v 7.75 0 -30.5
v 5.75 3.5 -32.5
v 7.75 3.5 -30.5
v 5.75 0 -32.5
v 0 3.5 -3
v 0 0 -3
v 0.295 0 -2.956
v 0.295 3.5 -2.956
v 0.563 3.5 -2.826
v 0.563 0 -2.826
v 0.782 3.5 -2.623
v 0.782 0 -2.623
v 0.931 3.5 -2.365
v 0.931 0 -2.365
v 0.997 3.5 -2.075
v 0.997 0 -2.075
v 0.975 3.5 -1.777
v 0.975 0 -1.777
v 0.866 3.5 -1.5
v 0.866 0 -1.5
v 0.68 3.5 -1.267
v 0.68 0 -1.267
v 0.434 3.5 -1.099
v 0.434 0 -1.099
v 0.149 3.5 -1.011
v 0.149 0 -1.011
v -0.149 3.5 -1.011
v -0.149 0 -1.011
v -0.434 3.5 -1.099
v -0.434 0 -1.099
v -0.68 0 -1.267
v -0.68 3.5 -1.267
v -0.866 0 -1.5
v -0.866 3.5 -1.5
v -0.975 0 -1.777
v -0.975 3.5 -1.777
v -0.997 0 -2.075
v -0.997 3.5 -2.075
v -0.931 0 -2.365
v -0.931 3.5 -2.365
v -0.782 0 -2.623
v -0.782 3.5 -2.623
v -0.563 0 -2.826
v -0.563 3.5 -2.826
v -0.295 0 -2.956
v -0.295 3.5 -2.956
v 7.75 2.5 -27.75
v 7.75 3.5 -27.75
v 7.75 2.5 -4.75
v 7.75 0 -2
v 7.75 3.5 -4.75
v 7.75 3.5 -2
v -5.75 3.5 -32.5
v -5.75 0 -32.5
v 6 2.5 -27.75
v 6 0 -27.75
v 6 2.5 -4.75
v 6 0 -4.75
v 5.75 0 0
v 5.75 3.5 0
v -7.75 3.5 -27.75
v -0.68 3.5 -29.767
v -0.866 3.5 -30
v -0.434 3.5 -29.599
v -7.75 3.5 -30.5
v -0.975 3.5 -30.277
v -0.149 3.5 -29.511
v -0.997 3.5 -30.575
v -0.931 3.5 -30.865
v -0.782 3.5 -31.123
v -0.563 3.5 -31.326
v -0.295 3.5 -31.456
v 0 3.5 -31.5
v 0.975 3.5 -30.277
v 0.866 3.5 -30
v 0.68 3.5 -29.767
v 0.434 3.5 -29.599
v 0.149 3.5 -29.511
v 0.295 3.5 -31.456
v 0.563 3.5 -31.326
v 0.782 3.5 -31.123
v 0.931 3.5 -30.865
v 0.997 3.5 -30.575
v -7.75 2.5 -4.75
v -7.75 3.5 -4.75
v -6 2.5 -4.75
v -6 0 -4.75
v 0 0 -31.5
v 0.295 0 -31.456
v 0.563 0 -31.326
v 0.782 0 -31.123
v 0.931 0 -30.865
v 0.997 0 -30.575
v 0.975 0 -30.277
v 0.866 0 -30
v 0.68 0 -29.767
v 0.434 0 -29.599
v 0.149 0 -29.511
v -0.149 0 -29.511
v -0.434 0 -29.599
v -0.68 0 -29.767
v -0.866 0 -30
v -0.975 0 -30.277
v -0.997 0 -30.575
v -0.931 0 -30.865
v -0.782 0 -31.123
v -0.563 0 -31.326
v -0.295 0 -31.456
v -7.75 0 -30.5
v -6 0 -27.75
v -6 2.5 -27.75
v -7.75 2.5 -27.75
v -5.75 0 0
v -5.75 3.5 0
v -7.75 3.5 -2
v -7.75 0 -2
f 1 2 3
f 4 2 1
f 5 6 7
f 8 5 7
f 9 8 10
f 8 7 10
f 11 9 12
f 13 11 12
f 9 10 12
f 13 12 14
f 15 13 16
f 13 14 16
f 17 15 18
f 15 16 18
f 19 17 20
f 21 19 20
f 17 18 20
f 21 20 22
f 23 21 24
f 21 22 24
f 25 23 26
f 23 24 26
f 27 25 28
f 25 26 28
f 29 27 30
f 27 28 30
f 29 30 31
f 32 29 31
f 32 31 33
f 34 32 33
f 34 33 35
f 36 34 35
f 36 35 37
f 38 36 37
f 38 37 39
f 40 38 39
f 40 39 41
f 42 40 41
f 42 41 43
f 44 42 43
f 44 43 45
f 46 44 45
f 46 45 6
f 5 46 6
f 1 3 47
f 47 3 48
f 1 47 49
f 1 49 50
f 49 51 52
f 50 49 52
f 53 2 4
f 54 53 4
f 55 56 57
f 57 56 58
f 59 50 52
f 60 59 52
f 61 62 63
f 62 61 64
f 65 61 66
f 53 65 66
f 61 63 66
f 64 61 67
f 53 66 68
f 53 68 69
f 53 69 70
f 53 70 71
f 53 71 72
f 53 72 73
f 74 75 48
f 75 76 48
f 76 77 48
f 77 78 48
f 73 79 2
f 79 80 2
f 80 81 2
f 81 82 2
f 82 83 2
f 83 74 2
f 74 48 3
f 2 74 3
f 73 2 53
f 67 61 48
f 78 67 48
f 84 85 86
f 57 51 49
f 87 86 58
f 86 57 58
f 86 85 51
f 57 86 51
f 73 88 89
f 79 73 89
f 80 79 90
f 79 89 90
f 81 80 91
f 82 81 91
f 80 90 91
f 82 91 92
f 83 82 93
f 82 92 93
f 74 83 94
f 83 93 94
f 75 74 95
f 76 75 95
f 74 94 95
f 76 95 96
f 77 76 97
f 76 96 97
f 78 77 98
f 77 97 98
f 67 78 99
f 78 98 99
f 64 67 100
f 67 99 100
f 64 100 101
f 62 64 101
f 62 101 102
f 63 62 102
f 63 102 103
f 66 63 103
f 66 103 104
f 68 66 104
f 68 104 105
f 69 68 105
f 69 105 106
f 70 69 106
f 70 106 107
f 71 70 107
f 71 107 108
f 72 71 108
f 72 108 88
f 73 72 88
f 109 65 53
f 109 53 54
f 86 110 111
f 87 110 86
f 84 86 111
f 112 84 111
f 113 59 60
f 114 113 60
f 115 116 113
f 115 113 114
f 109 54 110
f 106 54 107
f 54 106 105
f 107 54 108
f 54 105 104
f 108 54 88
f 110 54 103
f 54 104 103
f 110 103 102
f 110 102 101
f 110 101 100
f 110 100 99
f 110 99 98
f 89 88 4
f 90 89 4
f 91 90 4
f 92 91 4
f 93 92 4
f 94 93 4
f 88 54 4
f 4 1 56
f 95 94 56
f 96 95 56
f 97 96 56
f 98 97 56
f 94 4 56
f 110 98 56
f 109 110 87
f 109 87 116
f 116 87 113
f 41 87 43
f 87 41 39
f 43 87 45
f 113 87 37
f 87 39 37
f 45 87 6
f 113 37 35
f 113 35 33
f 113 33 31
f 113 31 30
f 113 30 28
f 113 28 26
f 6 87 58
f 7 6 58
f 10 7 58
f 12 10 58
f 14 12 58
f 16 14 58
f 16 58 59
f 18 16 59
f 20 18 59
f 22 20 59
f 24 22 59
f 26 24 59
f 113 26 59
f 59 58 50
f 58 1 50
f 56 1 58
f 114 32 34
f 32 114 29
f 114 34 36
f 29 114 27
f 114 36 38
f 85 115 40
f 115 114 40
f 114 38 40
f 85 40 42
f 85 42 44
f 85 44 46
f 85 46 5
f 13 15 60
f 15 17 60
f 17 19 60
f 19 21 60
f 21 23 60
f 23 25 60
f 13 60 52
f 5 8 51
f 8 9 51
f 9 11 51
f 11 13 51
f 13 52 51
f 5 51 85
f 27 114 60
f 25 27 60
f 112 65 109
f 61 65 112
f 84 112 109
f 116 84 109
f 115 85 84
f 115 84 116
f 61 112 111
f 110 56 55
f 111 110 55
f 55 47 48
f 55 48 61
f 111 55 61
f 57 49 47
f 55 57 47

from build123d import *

# Parameters (mm, degrees)
EXTRUDE_1_DEPTH     = 7.75
SKETCH_3_R          = 1
SKETCH_3_W          = 12
SKETCH_3_H          = 23
CUT_EXTRUDE_1_DEPTH = 34.594084301
CHAMFER_1_SIZE      = 2


with BuildPart() as part:
    # 草圖2 → 填料-伸長1 (new, symmetric)
    with BuildSketch(Plane(origin=(0, 0, 0), x_dir=(0, 0, -1), z_dir=(1, 0, 0))):
        Polygon((27.75, 3.5), (32.5, 3.5), (32.5, 0), (0, 0), (0, 3.5), (4.75, 3.5), (4.75, 2.5), (27.75, 2.5), align=None)
    extrude(amount=EXTRUDE_1_DEPTH, both=True)

    # 草圖3 → 除料-伸長1 (cut, through all)
    with BuildSketch(Plane.XZ):
        with Locations(Location((0, -2, 0), (0, 0, 270))):
            Circle(SKETCH_3_R)
        with Locations(Location((0, -30.5, 0), (0, 0, 270))):
            Circle(SKETCH_3_R)
        with Locations((0, -16.25)):
            Rectangle(SKETCH_3_W, SKETCH_3_H)
    extrude(amount=-CUT_EXTRUDE_1_DEPTH, mode=Mode.SUBTRACT)

    # 導角1
    chamfer_1_edges = [part.edges().sort_by_distance(p)[0] for p in [
        (7.75, 1.75, -32.5),
        (-7.75, 1.75, 0),
        (7.75, 1.75, 0),
        (-7.75, 1.75, -32.5),
    ]]
    chamfer(chamfer_1_edges, length=CHAMFER_1_SIZE)


solid = part.part
